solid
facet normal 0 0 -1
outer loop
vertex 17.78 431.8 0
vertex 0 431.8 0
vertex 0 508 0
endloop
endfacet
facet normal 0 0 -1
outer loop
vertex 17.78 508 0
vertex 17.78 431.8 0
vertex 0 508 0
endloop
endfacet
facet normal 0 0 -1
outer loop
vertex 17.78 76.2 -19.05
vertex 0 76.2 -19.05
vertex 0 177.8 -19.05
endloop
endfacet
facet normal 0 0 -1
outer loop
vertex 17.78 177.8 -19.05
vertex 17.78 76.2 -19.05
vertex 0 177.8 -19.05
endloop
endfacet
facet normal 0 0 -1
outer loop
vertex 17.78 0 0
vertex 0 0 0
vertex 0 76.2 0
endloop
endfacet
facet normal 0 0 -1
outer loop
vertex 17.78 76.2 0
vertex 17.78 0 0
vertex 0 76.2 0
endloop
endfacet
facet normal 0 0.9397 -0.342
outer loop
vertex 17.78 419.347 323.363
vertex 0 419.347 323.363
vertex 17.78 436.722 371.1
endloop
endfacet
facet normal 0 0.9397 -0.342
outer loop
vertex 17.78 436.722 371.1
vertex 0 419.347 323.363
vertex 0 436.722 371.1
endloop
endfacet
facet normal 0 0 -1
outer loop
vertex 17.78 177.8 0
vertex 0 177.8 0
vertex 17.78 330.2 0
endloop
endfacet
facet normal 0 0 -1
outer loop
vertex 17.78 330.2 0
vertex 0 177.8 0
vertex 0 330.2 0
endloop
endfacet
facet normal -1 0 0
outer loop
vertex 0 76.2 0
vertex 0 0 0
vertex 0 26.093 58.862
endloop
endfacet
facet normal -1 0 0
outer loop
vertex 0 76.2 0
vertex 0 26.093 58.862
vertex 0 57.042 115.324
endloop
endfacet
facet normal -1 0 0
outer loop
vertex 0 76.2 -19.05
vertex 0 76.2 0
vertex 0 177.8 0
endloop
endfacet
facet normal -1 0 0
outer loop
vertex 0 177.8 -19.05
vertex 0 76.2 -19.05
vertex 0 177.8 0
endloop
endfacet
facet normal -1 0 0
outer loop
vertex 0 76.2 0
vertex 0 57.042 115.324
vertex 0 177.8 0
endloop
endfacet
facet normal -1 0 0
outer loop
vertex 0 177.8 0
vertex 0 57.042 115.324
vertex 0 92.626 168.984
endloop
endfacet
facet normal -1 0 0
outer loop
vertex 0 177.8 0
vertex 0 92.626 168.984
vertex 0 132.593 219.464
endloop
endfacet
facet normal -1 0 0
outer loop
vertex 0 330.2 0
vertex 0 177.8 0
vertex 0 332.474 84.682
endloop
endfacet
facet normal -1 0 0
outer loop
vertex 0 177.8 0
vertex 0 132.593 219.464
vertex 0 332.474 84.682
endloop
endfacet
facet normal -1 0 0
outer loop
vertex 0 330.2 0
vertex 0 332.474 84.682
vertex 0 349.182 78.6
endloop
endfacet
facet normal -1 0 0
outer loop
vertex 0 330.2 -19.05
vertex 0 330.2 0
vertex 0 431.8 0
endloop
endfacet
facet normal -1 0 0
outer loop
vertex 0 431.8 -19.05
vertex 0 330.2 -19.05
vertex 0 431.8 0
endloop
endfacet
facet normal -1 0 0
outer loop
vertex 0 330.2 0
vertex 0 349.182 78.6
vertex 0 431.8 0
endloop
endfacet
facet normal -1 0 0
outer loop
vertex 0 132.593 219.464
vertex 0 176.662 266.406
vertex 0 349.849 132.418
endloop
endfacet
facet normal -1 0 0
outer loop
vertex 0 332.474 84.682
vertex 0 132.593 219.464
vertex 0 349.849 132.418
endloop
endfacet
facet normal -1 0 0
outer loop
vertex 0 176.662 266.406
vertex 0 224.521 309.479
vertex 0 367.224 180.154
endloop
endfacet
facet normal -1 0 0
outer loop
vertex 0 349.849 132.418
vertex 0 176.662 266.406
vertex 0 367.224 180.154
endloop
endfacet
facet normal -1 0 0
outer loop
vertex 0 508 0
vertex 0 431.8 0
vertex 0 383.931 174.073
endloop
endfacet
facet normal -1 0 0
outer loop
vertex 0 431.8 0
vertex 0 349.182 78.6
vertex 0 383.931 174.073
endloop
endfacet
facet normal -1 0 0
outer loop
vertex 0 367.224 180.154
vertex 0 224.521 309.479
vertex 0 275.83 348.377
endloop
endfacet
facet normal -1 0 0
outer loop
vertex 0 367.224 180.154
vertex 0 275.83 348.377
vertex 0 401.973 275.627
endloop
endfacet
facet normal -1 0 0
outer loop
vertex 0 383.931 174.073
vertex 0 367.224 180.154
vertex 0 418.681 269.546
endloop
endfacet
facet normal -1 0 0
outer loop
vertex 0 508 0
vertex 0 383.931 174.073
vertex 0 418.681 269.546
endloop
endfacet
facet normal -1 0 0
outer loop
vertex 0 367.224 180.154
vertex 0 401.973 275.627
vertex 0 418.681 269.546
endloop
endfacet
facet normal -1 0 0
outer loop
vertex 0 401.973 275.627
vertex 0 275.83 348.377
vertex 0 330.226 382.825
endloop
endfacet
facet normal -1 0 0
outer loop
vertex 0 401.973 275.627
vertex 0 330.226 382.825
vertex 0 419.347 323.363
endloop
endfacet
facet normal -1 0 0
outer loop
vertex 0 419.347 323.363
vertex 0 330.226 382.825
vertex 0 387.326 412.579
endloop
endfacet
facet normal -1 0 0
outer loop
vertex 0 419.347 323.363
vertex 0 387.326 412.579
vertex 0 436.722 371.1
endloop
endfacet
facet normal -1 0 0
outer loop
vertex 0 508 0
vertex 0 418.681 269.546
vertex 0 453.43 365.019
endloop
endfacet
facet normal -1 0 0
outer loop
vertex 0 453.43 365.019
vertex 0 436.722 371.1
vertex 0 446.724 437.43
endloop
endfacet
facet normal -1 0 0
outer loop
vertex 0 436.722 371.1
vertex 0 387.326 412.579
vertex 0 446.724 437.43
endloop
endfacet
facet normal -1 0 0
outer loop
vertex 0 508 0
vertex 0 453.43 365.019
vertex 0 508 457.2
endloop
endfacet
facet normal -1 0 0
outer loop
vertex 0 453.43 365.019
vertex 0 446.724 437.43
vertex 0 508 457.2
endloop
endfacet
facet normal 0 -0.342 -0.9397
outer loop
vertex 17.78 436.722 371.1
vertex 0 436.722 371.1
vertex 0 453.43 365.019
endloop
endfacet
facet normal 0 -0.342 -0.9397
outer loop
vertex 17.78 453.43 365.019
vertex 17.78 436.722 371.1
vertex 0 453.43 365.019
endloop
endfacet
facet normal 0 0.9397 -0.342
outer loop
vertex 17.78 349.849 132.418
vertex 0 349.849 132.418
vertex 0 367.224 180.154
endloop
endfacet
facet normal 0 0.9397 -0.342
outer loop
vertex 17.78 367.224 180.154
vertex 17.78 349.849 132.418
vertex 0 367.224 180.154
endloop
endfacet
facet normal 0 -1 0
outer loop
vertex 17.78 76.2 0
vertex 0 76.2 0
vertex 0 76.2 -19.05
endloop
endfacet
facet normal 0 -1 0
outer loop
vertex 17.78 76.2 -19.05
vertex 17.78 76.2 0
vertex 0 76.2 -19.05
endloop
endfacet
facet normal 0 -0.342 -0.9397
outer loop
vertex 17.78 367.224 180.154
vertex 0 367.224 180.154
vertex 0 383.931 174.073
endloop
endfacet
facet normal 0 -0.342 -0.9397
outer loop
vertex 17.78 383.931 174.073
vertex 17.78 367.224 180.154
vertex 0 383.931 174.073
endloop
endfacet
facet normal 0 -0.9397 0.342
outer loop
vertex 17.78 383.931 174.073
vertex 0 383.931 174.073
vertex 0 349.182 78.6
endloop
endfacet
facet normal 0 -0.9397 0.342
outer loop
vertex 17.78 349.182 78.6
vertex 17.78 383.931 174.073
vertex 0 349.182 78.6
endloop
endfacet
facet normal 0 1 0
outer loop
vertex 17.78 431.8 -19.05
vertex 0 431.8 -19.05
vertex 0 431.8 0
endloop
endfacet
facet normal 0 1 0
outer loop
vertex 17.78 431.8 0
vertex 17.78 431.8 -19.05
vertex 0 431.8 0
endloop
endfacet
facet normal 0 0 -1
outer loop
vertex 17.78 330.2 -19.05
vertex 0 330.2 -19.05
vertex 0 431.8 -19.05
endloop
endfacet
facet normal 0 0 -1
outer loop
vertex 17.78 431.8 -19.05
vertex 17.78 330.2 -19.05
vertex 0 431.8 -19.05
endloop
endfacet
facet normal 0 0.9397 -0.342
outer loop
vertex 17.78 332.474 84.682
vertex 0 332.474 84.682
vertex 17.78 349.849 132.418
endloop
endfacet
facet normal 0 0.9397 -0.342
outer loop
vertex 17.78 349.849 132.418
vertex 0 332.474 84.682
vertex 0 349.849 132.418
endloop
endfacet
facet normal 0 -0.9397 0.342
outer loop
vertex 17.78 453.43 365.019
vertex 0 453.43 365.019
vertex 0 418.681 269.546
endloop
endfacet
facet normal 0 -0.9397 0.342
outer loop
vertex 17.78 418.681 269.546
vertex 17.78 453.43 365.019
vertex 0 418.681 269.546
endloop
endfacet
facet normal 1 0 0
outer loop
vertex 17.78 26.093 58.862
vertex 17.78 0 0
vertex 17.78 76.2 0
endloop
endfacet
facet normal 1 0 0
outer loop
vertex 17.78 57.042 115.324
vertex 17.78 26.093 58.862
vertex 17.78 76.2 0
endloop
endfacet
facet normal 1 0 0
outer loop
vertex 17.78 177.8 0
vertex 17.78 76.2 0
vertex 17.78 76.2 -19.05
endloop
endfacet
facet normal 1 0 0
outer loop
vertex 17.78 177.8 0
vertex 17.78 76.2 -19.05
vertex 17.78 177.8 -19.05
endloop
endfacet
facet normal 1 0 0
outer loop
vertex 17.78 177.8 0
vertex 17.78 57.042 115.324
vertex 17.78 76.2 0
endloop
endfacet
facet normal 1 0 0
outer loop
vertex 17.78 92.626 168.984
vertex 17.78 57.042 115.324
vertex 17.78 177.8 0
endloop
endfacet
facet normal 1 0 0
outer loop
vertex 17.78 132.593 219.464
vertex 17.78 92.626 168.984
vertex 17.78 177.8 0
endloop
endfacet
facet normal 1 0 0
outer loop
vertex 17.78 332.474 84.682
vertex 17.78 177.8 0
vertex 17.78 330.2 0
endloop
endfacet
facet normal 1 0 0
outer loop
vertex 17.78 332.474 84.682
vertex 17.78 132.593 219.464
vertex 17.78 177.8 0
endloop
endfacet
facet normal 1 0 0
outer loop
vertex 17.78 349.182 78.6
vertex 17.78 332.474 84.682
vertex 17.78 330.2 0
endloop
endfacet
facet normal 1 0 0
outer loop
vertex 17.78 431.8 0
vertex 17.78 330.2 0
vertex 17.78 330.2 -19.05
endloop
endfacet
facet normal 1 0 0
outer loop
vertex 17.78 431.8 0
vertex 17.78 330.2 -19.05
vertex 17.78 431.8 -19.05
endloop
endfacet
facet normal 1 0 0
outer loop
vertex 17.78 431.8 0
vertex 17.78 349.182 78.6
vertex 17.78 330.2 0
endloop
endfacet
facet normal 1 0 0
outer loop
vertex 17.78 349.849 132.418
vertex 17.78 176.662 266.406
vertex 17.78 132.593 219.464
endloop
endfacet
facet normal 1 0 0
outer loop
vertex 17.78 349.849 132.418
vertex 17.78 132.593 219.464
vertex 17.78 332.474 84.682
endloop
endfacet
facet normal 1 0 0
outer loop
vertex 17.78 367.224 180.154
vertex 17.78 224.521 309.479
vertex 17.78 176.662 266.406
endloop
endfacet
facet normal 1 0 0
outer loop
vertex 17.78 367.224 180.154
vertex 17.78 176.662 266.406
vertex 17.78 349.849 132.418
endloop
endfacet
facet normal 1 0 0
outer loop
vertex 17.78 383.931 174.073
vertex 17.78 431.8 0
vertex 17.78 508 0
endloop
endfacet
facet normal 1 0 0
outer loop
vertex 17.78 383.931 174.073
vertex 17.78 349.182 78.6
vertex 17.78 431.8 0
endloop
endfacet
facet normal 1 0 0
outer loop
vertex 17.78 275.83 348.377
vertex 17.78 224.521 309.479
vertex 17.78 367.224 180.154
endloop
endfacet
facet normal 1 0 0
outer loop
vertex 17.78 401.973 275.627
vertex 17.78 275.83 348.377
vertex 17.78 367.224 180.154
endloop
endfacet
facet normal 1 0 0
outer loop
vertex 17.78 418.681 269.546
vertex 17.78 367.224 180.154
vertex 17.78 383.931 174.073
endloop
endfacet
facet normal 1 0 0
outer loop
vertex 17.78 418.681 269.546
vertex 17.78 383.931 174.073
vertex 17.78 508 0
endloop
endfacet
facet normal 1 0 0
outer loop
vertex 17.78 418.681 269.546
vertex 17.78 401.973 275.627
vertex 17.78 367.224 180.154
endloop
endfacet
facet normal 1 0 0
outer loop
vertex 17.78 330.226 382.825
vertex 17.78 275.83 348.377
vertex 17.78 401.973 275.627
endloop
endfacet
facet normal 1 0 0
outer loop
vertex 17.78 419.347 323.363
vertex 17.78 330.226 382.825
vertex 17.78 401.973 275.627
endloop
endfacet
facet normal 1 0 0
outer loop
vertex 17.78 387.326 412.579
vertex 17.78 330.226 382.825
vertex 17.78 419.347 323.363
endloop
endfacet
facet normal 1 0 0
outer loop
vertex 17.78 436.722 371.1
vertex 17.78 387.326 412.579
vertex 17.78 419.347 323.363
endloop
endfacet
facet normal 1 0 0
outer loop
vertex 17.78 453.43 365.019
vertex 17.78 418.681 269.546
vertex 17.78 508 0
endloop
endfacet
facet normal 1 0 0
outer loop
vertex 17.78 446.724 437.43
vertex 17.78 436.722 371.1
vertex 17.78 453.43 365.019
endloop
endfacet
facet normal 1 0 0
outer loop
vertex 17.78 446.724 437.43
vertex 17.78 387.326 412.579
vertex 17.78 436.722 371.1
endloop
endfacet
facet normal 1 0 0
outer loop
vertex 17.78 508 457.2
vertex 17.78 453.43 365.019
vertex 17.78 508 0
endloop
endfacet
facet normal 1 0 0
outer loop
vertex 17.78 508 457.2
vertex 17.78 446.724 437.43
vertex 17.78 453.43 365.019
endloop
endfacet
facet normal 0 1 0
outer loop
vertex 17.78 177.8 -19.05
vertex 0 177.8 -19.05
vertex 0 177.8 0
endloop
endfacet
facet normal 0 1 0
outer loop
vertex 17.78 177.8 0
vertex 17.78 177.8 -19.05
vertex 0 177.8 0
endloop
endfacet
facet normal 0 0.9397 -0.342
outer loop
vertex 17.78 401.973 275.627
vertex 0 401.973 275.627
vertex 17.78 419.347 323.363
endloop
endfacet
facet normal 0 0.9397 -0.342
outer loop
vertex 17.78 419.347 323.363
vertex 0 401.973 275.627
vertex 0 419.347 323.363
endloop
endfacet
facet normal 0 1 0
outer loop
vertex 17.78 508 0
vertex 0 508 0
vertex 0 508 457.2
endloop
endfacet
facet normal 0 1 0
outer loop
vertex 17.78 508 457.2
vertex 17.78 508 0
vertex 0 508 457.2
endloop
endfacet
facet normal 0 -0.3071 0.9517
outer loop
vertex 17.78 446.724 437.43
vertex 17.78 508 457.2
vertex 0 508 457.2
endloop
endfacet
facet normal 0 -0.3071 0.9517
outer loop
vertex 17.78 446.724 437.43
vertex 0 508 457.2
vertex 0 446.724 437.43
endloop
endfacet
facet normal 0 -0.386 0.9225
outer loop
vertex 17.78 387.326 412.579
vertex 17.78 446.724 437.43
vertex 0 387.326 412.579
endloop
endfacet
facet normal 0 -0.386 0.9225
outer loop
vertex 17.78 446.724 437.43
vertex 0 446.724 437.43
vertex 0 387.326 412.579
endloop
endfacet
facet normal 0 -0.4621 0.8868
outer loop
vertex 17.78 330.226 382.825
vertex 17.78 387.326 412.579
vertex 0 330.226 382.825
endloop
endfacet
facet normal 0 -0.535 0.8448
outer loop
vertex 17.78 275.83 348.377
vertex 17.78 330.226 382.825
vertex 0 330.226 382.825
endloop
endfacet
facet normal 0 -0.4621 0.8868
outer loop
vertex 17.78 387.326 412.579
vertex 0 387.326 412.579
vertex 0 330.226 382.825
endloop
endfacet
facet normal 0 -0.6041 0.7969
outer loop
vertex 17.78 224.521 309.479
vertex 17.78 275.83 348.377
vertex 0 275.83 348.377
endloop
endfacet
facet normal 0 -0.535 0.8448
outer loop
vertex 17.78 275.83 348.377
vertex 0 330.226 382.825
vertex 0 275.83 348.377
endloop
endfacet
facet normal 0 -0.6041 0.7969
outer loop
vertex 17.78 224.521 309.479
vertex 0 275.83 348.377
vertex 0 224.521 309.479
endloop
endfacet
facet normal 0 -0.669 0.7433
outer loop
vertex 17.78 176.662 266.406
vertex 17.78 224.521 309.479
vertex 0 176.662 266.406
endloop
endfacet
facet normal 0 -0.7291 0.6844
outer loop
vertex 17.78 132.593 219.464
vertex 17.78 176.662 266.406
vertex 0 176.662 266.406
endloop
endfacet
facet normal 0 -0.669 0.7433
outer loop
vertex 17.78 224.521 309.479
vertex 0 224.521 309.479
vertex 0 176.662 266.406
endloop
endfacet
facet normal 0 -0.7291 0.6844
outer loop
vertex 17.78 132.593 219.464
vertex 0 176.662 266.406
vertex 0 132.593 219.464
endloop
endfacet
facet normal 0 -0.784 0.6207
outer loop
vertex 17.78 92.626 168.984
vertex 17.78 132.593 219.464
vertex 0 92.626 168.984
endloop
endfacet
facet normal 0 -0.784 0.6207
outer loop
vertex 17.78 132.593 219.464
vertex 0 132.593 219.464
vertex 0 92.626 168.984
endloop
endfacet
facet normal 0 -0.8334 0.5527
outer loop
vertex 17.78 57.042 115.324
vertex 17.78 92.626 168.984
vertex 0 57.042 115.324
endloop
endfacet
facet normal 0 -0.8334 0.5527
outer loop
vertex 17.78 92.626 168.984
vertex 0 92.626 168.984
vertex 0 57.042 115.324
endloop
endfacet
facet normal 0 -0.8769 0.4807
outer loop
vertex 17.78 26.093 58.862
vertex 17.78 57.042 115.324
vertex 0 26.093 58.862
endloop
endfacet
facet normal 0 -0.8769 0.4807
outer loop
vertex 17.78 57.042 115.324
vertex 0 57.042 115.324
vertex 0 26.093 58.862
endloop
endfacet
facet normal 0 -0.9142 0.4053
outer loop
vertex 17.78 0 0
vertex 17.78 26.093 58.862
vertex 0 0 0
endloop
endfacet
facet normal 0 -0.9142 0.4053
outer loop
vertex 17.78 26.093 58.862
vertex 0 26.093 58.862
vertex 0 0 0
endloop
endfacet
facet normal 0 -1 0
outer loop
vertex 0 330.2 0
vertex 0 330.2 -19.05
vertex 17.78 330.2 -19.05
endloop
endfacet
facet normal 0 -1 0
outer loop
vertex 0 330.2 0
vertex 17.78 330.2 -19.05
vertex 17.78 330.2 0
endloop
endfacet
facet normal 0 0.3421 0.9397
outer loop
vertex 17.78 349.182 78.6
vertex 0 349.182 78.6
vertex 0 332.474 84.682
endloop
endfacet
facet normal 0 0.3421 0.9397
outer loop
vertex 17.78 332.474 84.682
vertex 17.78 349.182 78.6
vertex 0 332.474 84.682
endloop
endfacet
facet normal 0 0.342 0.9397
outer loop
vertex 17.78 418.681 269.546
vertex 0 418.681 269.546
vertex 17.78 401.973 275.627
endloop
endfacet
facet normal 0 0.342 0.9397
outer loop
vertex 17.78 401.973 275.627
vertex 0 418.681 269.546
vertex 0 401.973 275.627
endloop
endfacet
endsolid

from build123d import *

# Parameters (mm, degrees)
F0_W     = 101.6
F0_H     = 19.05
F1_DEPTH = 17.78


# Not quite as in the source:
# - a feature names something its author has since deleted; it is built from what else it names


with BuildPart() as f1:
    # F0 (on Right) → F1 (new body)
    with BuildSketch(Plane.YZ):
        with BuildLine():
            ThreePointArc((508, 457.2), (375.1962383216, 406.7634952275), (254, 332.6544408126))
            Line((254, 332.6544408126), (254, 0))
            Line((254, 0), (330.2, 0))
            Line((330.2, 0), (431.8, 0))
            Line((431.8, 0), (508, 0))
            Line((508, 0), (508, 457.2))
        make_face()
        Polygon((349.8489306504, 132.4179212181), (367.2235539314, 180.154306354), (383.9312887289, 174.0731882056), (349.182042167, 78.6004179338), (332.4743073695, 84.6815360821), align=None, mode=Mode.SUBTRACT)
        Polygon((401.9728004932, 275.6270766258), (419.3474237742, 323.3634617617), (436.7220470551, 371.0998468977), (453.4297818527, 365.0187287493), (418.6805352908, 269.5459584775), align=None, mode=Mode.SUBTRACT)
        Polygon((127, 0), (76.2, 0), (76.2, -19.05), (177.8, -19.05), (177.8, 0), align=None)
        with BuildLine():
            ThreePointArc((254, 332.6544408126), (103.8213611206, 184.0253886947), (0, 0))
            Line((0, 0), (76.2, 0))
            Line((76.2, 0), (127, 0))
            Line((127, 0), (177.8, 0))
            Line((177.8, 0), (254, 0))
            Line((254, 0), (254, 332.6544408126))
        make_face()
        with Locations((381, -9.525)):
            Rectangle(F0_W, F0_H)
    extrude(amount=F1_DEPTH)


solid = f1.part
